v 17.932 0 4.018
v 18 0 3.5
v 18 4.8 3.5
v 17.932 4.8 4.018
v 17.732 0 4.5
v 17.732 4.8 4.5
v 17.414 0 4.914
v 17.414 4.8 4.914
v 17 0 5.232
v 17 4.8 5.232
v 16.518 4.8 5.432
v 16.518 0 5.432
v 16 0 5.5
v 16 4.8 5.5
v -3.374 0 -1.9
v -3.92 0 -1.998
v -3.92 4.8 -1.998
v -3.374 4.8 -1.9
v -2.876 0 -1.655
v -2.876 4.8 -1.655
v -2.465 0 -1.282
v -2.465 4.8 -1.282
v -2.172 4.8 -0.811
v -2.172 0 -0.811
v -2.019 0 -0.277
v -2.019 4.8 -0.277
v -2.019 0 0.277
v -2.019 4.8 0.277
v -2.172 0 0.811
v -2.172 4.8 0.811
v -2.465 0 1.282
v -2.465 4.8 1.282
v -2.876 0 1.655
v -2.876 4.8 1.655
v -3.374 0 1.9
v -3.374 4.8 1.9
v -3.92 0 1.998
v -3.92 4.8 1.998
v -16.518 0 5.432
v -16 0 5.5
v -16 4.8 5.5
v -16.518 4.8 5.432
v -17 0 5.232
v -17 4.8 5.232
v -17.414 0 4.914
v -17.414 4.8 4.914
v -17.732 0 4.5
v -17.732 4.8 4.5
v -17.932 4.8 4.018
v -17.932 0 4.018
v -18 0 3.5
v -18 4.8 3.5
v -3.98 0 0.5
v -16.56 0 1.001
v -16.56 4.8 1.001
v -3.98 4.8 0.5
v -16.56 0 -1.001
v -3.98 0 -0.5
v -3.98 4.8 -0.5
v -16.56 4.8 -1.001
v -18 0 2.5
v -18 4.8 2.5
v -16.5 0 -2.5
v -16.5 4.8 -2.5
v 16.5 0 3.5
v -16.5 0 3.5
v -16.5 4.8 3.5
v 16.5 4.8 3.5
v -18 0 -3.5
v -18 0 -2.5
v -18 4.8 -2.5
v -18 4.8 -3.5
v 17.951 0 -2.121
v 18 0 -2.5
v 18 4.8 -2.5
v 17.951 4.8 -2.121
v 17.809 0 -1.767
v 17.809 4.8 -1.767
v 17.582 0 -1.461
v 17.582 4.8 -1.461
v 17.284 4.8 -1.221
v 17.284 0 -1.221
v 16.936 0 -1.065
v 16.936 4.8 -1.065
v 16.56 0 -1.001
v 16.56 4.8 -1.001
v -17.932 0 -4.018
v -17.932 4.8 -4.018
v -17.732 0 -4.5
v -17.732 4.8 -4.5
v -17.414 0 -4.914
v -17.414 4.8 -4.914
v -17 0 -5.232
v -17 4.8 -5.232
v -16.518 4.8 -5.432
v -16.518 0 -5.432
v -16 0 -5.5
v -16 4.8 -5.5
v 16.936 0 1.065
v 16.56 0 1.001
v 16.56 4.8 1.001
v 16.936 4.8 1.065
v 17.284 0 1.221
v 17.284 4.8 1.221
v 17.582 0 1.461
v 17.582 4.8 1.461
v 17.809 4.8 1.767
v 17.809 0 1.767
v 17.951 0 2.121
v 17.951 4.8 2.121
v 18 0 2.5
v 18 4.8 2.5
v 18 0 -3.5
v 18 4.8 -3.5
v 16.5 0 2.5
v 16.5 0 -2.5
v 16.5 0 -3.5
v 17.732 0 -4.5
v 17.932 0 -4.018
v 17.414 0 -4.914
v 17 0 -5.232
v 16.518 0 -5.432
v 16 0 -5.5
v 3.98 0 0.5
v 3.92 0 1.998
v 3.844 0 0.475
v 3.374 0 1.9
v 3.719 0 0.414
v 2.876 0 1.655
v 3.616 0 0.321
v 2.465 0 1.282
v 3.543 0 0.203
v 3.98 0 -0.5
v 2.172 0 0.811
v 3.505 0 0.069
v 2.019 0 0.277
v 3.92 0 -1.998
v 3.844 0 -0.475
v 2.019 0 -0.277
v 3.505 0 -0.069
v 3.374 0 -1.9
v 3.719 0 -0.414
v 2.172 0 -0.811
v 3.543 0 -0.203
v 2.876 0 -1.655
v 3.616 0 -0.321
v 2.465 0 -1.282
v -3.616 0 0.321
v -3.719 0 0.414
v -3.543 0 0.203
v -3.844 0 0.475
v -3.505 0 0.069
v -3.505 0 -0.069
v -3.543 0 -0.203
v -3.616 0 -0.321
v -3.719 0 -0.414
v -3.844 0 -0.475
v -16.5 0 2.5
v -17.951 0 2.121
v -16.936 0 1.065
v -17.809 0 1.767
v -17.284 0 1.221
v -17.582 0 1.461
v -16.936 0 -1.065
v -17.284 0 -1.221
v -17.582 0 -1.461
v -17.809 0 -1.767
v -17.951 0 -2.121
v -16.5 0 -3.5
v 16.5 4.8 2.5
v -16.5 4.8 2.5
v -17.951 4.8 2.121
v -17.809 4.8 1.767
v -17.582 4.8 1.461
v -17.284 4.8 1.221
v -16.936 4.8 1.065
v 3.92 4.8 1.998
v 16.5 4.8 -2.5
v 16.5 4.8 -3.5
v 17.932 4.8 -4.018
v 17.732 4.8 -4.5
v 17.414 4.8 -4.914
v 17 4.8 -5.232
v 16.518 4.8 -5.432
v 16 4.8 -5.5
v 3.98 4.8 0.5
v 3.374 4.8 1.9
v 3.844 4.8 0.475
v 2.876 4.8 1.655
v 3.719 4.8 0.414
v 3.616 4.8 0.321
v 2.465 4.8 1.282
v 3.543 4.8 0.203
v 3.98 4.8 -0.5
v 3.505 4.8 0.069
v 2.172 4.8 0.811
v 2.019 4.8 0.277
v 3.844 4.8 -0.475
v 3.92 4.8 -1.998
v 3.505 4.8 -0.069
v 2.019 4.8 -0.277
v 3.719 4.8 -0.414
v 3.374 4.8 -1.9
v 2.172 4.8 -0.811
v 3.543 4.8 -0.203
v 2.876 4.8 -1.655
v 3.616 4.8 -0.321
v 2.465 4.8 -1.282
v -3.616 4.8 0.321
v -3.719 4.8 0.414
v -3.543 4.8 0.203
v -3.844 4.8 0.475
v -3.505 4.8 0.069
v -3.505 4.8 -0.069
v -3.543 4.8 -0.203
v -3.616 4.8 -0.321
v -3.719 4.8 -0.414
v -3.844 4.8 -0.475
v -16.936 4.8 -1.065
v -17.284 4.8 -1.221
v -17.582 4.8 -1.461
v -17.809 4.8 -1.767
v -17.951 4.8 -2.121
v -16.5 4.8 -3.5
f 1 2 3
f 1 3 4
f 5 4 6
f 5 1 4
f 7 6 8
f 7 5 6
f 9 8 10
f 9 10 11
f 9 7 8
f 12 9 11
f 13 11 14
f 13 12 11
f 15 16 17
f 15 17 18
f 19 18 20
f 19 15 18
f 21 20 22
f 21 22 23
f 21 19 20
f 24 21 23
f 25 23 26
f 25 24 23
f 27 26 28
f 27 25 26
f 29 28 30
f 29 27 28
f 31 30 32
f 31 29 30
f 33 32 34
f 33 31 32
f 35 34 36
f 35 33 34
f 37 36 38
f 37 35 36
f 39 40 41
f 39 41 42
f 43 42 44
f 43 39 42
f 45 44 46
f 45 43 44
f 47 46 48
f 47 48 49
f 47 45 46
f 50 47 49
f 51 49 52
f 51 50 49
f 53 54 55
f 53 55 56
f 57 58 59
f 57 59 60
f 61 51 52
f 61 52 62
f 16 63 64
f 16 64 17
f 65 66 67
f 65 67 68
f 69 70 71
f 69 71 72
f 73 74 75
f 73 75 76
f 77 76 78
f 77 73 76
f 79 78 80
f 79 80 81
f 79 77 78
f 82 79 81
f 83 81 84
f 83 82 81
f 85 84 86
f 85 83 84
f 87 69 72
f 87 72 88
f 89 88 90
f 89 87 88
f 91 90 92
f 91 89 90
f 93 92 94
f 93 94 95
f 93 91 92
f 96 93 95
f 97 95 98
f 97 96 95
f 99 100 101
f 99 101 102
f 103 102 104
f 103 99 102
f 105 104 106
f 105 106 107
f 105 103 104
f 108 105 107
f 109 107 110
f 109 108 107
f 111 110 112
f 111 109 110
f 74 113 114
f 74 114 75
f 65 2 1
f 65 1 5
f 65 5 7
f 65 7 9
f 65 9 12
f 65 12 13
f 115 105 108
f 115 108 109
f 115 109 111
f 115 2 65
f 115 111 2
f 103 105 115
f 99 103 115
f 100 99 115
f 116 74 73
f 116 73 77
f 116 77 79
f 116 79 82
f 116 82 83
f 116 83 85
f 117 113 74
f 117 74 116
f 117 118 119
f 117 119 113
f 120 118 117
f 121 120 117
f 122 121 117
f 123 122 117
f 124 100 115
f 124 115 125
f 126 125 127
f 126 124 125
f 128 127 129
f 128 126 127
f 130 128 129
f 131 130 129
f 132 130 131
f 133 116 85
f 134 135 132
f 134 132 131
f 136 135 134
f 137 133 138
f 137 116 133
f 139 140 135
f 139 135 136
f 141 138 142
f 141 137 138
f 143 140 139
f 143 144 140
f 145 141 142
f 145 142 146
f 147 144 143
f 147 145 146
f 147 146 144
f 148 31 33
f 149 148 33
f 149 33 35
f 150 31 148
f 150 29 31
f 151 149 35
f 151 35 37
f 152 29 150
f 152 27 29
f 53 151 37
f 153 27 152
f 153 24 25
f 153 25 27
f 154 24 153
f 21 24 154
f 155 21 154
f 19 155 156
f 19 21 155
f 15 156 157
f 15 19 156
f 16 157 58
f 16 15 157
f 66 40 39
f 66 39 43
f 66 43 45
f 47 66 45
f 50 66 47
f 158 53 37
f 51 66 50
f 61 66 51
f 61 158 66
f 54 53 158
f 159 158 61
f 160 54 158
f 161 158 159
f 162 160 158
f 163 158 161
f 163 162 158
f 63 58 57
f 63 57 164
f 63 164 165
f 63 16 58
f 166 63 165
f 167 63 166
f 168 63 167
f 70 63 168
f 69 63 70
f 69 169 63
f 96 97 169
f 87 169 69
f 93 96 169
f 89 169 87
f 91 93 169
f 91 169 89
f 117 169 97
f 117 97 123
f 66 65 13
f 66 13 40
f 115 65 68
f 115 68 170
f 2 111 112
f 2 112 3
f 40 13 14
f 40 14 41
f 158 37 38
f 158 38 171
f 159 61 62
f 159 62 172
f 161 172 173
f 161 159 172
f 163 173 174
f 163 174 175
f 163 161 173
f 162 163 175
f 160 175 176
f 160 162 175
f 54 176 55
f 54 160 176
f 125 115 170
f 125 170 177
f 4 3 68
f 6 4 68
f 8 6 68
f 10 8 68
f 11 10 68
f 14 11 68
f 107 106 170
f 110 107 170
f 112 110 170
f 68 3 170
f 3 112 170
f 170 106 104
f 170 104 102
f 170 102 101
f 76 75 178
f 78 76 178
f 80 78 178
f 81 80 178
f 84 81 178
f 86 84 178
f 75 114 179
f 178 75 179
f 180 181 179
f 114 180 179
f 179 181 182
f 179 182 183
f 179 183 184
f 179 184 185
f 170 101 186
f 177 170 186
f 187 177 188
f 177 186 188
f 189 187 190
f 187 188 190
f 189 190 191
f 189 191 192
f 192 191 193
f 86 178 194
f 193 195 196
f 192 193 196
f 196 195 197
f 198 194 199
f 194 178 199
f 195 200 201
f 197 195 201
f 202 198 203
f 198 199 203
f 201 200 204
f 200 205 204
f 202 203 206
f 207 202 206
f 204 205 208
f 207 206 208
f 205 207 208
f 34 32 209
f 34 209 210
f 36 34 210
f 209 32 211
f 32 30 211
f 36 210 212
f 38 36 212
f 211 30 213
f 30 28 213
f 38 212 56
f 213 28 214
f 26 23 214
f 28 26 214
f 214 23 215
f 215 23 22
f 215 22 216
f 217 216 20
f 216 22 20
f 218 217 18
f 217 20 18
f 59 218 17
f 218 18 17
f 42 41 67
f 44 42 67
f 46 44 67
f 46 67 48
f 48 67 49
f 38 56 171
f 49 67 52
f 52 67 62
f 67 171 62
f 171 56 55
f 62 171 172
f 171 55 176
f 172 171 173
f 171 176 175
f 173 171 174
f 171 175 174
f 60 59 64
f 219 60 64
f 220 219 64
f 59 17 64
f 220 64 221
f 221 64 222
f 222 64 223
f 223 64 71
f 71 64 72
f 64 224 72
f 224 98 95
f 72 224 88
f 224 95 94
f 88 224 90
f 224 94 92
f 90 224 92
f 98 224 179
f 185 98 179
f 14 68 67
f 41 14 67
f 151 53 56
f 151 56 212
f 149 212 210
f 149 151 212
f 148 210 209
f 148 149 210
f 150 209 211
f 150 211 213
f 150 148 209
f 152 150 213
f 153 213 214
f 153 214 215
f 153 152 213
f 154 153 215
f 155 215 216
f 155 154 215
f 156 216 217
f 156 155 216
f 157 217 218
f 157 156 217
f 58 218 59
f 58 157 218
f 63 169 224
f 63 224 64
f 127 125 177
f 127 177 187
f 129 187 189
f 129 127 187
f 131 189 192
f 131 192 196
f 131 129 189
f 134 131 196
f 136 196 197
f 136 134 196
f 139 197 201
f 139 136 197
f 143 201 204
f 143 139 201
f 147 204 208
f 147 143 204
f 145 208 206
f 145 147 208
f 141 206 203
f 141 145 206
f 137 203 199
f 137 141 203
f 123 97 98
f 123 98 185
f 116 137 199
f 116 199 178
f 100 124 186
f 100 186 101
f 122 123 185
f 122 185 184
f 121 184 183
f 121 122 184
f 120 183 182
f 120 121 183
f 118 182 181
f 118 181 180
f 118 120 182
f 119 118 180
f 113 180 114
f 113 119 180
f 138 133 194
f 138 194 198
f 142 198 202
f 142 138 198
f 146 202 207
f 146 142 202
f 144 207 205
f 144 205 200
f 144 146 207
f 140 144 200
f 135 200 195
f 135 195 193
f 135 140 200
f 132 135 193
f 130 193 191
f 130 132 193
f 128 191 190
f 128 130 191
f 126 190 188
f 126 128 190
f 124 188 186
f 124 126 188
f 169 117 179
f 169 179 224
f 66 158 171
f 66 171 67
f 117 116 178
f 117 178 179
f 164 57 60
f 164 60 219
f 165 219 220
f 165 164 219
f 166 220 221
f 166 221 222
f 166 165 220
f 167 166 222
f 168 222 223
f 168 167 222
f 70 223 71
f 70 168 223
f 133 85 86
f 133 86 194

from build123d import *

# Parameters (mm, degrees)
BOSS_EXTRUDE1_DEPTH = 4.8


with BuildPart() as part:
    # Sketch1 → Boss-Extrude1 (new body)
    with BuildSketch(Plane(origin=(0, 0, 0), x_dir=(1, 0, 0), z_dir=(0, 1, 0))):
        with BuildLine():
            Line((18, 3.5), (18, 2.5))
            ThreePointArc((18, 2.5), (17.581582801, 1.460683569), (16.559761807, 1.001190964))
            Line((16.559761807, 1.001190964), (3.980079398, 0.499603012))
            ThreePointArc((3.980079398, 0.499603012), (3.5, 0), (3.980079398, -0.499603012))
            Line((3.980079398, -0.499603012), (16.559761807, -1.001190964))
            ThreePointArc((16.559761807, -1.001190964), (17.581582801, -1.460683569), (18, -2.5))
            Line((18, -2.5), (18, -3.5))
            ThreePointArc((18, -3.5), (17.414213562, -4.914213562), (16, -5.5))
            Line((16, -5.5), (-16, -5.5))
            ThreePointArc((-16, -5.5), (-17.414213562, -4.914213562), (-18, -3.5))
            Line((-18, -3.5), (-18, -2.5))
            ThreePointArc((-18, -2.5), (-17.581582801, -1.460683569), (-16.559761807, -1.001190964))
            Line((-16.559761807, -1.001190964), (-3.980079398, -0.499603012))
            ThreePointArc((-3.980079398, -0.499603012), (-3.5, 0), (-3.980079398, 0.499603012))
            Line((-3.980079398, 0.499603012), (-16.559761807, 1.001190964))
            ThreePointArc((-16.559761807, 1.001190964), (-17.581582801, 1.460683569), (-18, 2.5))
            Line((-18, 2.5), (-18, 3.5))
            ThreePointArc((-18, 3.5), (-17.414213562, 4.914213562), (-16, 5.5))
            Line((-16, 5.5), (16, 5.5))
            ThreePointArc((16, 5.5), (17.414213562, 4.914213562), (18, 3.5))
        make_face()
        with BuildLine():
            Line((16.5, 3.5), (-16.5, 3.5))
            Line((-16.5, 3.5), (-16.5, 2.5))
            Line((-16.5, 2.5), (-3.92031759, 1.998412048))
            ThreePointArc((-3.92031759, 1.998412048), (-2, 0), (-3.92031759, -1.998412048))
            Line((-3.92031759, -1.998412048), (-16.5, -2.5))
            Line((-16.5, -2.5), (-16.5, -3.5))
            Line((-16.5, -3.5), (16.5, -3.5))
            Line((16.5, -3.5), (16.5, -2.5))
            Line((16.5, -2.5), (3.92031759, -1.998412048))
            ThreePointArc((3.92031759, -1.998412048), (2, 0), (3.92031759, 1.998412048))
            Line((3.92031759, 1.998412048), (16.5, 2.5))
            Line((16.5, 2.5), (16.5, 3.5))
        make_face(mode=Mode.SUBTRACT)
    extrude(amount=BOSS_EXTRUDE1_DEPTH)


solid = part.part
